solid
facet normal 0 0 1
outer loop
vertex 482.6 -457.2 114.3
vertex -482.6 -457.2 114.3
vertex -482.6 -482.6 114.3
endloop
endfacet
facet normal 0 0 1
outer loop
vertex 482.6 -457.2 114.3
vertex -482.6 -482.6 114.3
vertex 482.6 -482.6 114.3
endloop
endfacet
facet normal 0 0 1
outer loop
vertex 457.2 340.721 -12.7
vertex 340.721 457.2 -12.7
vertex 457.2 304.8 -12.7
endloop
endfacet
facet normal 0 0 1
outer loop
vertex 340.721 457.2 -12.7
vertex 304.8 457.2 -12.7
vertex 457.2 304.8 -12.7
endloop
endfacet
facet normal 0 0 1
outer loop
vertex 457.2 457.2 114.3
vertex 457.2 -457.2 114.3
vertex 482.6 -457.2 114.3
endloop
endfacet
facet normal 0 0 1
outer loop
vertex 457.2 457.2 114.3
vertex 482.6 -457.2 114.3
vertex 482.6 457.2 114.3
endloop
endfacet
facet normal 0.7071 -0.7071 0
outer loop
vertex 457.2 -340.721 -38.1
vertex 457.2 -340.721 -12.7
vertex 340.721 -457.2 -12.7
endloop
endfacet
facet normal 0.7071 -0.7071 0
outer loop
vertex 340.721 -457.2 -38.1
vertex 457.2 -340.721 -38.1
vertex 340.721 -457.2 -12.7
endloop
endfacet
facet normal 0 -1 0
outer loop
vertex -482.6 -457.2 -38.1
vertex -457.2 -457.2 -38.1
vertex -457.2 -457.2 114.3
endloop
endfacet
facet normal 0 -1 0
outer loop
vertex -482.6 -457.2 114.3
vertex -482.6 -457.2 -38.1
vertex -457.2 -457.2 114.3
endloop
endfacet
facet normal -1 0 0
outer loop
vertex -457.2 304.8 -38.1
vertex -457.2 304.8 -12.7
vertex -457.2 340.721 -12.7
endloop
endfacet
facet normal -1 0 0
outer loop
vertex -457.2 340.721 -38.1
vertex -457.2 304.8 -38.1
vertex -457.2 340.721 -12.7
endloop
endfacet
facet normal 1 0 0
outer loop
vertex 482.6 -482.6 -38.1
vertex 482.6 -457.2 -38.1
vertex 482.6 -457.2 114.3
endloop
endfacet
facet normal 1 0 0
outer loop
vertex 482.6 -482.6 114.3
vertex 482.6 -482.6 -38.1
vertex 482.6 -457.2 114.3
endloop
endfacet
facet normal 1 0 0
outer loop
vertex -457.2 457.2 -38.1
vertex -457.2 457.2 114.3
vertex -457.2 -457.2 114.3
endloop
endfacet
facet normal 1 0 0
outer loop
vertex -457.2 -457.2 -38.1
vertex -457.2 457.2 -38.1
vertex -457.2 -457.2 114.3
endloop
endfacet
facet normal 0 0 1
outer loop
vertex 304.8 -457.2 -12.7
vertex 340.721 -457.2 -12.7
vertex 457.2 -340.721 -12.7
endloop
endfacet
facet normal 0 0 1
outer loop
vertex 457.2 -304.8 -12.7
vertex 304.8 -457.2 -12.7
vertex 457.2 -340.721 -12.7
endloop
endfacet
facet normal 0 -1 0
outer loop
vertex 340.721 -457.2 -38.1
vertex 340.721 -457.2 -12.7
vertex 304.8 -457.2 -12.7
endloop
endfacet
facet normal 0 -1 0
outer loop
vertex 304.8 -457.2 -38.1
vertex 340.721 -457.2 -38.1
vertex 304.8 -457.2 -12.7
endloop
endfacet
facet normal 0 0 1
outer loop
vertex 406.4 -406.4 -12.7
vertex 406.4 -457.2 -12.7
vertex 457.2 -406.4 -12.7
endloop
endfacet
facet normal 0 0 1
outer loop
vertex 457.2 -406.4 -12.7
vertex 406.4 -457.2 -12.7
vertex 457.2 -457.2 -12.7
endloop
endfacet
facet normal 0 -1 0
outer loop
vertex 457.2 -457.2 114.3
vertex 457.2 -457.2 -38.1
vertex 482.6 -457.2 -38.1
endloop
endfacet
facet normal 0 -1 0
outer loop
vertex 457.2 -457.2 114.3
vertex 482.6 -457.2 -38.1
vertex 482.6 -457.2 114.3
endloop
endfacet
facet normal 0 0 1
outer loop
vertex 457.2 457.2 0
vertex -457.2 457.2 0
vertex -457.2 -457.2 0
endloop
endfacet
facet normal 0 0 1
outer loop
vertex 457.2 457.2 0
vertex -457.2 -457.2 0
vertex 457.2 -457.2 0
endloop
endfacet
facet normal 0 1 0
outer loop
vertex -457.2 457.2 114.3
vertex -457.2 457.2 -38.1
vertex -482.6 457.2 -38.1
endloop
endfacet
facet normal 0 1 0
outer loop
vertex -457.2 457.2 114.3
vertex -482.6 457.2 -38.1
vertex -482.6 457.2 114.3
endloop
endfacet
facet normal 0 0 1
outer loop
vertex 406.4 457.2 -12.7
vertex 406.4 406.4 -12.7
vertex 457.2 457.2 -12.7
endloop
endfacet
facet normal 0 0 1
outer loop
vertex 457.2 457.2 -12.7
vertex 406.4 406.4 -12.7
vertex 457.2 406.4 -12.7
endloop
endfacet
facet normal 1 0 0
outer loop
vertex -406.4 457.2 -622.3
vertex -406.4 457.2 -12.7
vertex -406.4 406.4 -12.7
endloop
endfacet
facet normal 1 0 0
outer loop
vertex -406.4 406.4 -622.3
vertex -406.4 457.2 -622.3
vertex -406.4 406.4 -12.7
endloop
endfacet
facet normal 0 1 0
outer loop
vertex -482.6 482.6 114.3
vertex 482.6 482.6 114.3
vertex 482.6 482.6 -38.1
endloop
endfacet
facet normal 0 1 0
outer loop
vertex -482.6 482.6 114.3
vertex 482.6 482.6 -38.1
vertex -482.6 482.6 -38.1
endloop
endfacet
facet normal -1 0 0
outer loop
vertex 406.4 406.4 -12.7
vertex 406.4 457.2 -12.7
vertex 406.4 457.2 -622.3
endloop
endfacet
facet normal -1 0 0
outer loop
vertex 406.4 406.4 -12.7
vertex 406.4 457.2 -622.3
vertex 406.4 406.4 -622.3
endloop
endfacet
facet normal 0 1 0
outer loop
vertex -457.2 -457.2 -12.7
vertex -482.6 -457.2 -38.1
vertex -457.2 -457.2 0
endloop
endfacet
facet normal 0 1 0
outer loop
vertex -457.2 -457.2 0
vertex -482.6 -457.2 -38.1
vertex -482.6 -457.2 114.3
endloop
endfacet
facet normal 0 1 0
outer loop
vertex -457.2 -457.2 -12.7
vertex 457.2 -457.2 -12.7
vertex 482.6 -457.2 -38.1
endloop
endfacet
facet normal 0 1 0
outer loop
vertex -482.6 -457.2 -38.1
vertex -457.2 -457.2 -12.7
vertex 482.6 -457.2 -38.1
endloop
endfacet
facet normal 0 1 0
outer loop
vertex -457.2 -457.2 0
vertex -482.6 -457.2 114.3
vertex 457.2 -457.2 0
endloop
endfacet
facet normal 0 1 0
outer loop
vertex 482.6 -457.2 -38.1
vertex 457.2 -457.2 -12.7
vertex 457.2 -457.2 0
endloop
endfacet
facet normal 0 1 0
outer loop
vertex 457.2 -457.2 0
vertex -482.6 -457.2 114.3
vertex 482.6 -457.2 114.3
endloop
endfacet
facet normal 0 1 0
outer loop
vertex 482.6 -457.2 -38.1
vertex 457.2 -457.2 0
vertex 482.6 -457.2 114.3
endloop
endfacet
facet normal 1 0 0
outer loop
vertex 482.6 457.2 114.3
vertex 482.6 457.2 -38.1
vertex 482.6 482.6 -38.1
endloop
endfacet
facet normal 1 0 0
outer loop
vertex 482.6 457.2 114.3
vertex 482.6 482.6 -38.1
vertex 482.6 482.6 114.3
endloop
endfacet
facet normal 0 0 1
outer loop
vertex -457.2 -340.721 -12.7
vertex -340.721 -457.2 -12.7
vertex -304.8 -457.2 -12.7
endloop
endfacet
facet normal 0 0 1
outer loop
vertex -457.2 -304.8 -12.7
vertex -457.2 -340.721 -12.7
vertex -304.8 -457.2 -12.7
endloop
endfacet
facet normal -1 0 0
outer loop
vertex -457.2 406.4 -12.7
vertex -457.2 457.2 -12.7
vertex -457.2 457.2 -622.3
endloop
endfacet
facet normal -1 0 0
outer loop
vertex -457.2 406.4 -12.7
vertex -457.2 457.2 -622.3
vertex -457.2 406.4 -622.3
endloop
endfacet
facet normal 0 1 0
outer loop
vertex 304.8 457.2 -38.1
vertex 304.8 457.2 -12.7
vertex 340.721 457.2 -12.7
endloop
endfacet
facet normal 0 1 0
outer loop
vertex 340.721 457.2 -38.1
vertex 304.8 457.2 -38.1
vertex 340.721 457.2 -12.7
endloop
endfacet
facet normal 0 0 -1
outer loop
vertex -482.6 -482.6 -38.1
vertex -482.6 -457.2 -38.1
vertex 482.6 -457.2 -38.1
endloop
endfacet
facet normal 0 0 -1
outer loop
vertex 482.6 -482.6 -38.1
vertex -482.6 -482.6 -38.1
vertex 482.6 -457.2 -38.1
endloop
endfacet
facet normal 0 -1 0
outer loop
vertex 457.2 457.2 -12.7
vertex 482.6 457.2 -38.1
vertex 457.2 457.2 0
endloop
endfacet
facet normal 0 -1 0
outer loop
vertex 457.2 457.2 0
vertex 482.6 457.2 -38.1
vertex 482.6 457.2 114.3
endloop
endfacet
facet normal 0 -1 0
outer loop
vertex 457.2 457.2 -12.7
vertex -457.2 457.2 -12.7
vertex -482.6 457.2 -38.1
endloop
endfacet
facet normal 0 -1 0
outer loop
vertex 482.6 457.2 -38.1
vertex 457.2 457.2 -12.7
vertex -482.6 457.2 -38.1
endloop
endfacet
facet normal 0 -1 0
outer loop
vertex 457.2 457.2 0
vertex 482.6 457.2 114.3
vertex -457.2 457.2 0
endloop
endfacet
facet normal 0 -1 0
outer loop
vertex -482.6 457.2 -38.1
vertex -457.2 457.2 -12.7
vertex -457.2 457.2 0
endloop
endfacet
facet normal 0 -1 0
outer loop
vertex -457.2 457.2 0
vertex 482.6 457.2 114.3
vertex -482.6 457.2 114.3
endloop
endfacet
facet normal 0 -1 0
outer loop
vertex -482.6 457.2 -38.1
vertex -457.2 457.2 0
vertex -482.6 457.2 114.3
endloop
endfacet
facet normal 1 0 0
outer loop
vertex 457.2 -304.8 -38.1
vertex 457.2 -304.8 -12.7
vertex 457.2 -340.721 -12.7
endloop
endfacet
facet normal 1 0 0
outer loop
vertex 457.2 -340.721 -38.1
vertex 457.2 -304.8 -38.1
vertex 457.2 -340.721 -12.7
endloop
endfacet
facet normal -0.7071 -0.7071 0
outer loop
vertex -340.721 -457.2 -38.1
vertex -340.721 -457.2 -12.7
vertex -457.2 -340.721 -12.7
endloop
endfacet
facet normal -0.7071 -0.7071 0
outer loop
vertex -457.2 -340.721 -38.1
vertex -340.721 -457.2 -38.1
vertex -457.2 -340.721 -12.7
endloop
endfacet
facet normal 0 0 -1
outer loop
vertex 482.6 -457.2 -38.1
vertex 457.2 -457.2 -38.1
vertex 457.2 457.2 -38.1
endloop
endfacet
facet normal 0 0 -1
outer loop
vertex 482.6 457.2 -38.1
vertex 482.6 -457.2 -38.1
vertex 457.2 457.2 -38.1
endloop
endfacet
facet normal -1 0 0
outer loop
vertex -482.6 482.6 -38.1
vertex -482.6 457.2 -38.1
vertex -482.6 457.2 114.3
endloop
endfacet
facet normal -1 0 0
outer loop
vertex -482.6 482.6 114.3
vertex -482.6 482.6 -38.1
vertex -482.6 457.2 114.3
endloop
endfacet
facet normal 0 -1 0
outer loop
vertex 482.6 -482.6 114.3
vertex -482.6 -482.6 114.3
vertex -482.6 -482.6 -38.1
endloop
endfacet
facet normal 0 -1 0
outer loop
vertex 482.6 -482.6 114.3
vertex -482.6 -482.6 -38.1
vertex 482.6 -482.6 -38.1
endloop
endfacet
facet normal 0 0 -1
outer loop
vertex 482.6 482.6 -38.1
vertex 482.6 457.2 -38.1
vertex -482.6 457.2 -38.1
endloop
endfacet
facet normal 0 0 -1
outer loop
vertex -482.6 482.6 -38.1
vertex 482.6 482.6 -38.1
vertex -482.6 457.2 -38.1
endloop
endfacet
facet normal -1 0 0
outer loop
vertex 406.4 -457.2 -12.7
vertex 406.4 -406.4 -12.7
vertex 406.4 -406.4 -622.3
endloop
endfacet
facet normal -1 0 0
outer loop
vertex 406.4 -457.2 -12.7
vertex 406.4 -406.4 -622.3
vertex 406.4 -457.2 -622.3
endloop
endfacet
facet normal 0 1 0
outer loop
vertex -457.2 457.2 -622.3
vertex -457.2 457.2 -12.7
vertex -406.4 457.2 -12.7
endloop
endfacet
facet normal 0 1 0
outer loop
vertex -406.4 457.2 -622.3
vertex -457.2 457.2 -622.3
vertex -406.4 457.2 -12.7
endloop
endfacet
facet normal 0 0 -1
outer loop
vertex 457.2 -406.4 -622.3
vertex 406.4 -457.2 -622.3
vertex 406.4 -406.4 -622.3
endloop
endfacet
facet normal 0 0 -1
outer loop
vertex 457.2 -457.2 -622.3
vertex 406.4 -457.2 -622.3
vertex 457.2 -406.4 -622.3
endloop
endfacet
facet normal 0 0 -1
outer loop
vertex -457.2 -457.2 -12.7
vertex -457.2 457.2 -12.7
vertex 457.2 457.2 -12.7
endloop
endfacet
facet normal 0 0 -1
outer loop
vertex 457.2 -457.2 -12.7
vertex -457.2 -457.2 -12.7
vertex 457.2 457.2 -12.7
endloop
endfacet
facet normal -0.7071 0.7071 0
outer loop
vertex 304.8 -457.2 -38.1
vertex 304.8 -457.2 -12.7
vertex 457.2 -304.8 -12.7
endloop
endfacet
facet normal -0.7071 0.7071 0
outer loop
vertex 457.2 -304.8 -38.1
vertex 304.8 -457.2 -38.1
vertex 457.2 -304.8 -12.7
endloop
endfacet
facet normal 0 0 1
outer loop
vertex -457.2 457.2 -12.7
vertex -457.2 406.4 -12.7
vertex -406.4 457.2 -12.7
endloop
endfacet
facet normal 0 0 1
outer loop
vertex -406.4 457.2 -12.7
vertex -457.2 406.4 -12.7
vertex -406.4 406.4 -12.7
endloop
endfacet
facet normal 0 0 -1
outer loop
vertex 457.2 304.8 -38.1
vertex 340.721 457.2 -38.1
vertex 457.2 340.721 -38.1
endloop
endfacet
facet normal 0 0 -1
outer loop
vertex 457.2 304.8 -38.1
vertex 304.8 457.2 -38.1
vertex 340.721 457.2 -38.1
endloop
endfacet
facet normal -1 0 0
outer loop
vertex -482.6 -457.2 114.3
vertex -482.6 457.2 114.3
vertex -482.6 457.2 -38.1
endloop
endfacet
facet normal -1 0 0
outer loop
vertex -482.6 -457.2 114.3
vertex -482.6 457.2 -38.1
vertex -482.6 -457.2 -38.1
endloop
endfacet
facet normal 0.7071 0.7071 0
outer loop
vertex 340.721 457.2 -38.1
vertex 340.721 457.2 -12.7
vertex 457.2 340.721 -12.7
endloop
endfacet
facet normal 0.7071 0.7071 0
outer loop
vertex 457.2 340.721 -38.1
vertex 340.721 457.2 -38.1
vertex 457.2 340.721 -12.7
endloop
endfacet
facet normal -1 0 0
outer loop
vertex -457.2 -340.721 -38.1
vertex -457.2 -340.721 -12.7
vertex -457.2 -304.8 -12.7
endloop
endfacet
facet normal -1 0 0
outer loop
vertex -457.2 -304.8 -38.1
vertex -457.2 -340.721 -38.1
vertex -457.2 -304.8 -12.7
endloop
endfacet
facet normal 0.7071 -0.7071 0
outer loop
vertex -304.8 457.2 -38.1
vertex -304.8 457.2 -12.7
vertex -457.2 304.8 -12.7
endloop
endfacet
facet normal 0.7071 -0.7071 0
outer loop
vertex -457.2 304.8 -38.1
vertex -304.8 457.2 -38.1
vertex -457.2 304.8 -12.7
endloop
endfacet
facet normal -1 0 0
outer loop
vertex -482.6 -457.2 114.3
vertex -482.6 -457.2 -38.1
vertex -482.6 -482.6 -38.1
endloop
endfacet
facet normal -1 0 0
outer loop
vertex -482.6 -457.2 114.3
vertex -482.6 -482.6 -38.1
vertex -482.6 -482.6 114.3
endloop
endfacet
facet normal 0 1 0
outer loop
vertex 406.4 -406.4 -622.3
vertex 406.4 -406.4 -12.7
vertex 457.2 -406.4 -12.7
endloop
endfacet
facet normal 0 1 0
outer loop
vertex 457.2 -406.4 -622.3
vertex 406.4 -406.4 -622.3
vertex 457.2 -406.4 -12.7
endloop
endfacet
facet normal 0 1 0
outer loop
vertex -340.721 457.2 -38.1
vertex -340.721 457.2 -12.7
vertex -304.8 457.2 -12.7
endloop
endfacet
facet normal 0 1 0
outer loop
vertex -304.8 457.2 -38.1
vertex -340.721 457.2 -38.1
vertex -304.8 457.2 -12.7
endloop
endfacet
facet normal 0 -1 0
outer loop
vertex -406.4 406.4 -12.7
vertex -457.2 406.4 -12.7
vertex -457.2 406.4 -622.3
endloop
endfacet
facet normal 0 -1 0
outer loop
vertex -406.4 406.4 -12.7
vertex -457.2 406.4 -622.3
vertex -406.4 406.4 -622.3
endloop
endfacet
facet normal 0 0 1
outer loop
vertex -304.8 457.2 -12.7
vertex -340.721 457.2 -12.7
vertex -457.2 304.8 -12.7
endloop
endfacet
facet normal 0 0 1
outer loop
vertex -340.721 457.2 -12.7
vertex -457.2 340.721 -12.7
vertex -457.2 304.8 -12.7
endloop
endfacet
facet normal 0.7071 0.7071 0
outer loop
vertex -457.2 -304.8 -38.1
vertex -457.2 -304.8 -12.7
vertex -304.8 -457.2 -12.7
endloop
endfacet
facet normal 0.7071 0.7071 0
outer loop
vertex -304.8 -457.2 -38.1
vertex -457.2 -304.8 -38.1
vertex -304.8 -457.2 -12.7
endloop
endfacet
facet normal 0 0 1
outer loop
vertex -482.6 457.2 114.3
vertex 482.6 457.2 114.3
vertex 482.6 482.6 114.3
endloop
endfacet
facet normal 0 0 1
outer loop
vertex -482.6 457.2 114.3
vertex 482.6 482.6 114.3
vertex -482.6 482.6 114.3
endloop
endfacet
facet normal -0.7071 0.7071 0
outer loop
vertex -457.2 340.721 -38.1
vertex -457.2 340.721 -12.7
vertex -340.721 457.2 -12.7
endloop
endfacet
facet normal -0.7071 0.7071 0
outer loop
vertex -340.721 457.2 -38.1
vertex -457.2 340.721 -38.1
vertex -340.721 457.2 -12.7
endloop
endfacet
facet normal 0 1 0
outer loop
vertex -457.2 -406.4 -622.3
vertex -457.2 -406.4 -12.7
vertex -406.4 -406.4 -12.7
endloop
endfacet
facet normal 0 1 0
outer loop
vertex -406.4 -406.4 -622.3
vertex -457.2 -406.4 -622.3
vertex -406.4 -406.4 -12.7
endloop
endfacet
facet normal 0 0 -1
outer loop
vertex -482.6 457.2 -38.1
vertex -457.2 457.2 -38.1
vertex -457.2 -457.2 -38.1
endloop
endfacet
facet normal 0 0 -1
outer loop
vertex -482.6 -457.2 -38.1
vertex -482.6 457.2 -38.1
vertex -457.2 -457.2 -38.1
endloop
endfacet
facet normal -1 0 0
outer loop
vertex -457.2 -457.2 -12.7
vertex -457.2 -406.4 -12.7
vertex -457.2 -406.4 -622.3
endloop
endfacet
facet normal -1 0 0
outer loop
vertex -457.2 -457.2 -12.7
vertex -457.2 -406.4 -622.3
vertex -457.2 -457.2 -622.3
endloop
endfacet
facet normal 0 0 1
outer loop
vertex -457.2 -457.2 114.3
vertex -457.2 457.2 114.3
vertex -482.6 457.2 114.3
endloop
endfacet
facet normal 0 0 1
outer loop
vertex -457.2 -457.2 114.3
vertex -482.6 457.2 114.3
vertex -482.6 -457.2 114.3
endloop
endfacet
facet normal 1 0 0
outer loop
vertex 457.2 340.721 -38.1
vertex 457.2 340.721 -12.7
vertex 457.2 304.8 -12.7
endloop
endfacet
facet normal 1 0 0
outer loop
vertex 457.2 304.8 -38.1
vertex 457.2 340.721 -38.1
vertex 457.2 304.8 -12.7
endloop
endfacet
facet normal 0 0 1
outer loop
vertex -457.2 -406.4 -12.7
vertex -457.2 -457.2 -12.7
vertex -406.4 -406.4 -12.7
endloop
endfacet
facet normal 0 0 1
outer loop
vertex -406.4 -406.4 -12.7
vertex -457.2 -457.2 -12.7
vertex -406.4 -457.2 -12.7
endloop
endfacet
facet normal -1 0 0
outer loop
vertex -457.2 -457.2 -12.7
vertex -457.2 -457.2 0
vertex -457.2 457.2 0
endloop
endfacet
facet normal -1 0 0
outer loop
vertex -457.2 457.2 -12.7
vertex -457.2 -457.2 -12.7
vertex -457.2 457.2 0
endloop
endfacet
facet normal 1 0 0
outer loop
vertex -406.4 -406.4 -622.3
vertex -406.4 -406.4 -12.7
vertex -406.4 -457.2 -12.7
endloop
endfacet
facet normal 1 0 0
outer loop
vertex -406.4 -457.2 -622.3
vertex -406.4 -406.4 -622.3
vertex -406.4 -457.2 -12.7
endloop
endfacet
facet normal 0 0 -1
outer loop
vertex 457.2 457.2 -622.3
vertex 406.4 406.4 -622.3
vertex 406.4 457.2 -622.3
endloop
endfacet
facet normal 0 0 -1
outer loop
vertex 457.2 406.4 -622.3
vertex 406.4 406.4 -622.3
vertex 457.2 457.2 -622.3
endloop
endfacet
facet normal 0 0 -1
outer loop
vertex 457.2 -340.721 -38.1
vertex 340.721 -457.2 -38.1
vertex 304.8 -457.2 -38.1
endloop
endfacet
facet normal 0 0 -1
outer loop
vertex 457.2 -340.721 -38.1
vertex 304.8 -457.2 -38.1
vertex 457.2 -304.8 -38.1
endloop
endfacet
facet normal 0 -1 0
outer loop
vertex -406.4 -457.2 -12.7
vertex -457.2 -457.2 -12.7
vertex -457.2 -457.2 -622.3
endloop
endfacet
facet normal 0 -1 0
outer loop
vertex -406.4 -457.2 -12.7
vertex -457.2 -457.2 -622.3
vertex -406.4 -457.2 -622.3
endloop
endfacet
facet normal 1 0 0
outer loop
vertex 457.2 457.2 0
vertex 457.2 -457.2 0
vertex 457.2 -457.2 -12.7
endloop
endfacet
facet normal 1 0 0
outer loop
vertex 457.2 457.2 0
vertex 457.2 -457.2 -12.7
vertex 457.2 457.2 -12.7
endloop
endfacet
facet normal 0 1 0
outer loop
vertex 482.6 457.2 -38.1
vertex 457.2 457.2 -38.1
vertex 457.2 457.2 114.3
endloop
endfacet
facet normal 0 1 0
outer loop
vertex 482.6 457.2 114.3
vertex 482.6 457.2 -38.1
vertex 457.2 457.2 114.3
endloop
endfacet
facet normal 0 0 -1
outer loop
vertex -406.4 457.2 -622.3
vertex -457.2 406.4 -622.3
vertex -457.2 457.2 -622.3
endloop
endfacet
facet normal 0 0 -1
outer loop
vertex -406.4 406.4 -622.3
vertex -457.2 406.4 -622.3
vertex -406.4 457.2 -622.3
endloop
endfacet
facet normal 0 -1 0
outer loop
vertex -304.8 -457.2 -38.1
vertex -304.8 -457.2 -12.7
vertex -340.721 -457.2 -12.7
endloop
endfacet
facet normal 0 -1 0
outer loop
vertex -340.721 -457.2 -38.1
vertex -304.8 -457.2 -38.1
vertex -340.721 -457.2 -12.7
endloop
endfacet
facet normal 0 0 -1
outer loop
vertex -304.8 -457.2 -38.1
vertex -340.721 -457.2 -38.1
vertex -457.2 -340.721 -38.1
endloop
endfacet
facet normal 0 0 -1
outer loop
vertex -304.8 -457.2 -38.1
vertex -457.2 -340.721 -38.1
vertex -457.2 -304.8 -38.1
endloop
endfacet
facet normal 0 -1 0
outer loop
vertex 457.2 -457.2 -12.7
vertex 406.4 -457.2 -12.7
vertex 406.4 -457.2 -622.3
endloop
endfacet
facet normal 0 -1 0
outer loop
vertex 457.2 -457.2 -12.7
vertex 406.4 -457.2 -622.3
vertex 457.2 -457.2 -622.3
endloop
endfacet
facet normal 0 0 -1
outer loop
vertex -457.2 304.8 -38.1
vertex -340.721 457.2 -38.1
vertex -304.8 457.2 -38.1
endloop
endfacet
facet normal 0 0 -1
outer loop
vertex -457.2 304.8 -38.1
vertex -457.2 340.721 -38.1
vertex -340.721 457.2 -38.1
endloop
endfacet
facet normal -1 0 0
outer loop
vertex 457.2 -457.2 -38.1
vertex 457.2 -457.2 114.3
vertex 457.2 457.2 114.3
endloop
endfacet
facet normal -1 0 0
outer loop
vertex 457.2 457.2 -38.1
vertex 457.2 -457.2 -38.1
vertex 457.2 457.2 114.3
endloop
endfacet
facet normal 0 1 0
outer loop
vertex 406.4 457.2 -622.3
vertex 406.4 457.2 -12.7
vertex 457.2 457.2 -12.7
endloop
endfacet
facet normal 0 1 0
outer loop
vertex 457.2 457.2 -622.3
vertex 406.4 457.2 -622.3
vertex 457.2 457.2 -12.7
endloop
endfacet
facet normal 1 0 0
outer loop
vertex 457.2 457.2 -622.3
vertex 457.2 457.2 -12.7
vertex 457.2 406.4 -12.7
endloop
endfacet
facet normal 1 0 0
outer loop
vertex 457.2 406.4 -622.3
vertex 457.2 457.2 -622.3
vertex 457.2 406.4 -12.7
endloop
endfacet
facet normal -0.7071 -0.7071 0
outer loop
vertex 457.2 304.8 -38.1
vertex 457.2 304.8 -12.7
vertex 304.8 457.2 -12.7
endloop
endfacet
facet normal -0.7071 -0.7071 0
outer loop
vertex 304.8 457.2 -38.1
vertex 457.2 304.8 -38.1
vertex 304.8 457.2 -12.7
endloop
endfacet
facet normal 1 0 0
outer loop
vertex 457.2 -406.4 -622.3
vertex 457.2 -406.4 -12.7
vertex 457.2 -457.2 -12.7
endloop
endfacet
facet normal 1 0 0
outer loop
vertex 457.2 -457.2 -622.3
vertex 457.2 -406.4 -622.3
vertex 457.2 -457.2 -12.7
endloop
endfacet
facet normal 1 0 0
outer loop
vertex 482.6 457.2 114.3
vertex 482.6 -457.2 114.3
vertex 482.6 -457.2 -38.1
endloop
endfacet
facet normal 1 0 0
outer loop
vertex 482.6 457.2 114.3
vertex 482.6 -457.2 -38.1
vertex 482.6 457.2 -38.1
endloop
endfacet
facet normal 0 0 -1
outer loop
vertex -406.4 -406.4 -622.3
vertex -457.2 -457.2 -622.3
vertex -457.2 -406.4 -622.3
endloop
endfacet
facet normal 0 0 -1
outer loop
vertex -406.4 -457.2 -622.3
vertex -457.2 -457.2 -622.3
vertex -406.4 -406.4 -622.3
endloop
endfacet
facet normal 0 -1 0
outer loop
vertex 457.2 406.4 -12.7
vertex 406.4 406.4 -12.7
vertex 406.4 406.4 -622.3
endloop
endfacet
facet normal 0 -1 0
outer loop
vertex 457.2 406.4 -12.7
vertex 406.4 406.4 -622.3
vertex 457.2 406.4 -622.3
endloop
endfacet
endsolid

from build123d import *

# Parameters (mm, degrees)
F0_W      = 914.4
F0_H      = 914.4
F1_DEPTH  = 12.7
F2_W      = 965.2
F2_H      = 152.4
F3_DEPTH  = 25.4
F4_W      = 965.2
F4_H      = 152.4
F5_DEPTH  = 25.4
F6_W      = 914.4
F6_H      = 152.4
F7_DEPTH  = 25.4
F8_W      = 914.4
F8_H      = 152.4
F9_DEPTH  = 25.4
F11_DEPTH = 25.4
F12_W     = 50.8
F12_H     = 50.8
F13_DEPTH = 609.6


with BuildPart() as f1:
    # F0 (on Top) → F1 (new body)
    with BuildSketch(Plane.XY):
        Rectangle(F0_W, F0_H)
    extrude(amount=-F1_DEPTH)

    # F2 (on face) → F3 (join)
    with BuildSketch(Plane.XZ.offset(457.2)):
        with Locations((0, 38.1)):
            Rectangle(F2_W, F2_H)
    extrude(amount=F3_DEPTH)

    # F4 (on face) → F5 (join)
    with BuildSketch(Plane(origin=(0, 457.2, 0), x_dir=(-1, 0, 0), z_dir=(0, 1, 0))):
        with Locations((0, 38.1)):
            Rectangle(F4_W, F4_H)
    extrude(amount=F5_DEPTH)


with BuildPart() as f7:
    # F6 (on face) → F7 (new body)
    with BuildSketch(Plane(origin=(-457.2, 0, 0), x_dir=(0, -1, 0), z_dir=(-1, 0, 0))):
        with Locations((0, 38.1)):
            Rectangle(F6_W, F6_H)
    extrude(amount=F7_DEPTH)


with BuildPart() as f9:
    # F8 (on face) → F9 (new body)
    with BuildSketch(Plane.YZ.offset(457.2)):
        with Locations((0, 38.1)):
            Rectangle(F8_W, F8_H)
    extrude(amount=F9_DEPTH)


with BuildPart() as f11:
    # F10 (on face) → F11 (new body)
    with BuildSketch(Plane(origin=(0, 0, -12.7), x_dir=(1, 0, 0), z_dir=(0, 0, -1))):
        Polygon((-457.2, 304.8), (-304.8, 457.2), (-340.721024, 457.2), (-457.2, 340.721024), align=None)
        Polygon((340.721024, 457.2), (304.8, 457.2), (457.2, 304.8), (457.2, 340.721024), align=None)
        Polygon((340.721024, -457.2), (457.2, -340.721024), (457.2, -304.8), (304.8, -457.2), align=None)
        Polygon((-340.721024, -457.2), (-304.8, -457.2), (-457.2, -304.8), (-457.2, -340.721024), align=None)
    extrude(amount=F11_DEPTH)


with BuildPart() as f13:
    # F12 (on face) → F13 (new body)
    with BuildSketch(Plane(origin=(0, 0, -12.7), x_dir=(1, 0, 0), z_dir=(0, 0, -1))):
        with Locations((-431.8, 431.8)):
            Rectangle(F12_W, F12_H)
        with Locations((431.8, 431.8)):
            Rectangle(F12_W, F12_H)
        with Locations((431.8, -431.8)):
            Rectangle(F12_W, F12_H)
        with Locations((-431.8, -431.8)):
            Rectangle(F12_W, F12_H)
    extrude(amount=F13_DEPTH)


solid = Compound([f1.part, f7.part, f9.part, f11.part, f13.part])
